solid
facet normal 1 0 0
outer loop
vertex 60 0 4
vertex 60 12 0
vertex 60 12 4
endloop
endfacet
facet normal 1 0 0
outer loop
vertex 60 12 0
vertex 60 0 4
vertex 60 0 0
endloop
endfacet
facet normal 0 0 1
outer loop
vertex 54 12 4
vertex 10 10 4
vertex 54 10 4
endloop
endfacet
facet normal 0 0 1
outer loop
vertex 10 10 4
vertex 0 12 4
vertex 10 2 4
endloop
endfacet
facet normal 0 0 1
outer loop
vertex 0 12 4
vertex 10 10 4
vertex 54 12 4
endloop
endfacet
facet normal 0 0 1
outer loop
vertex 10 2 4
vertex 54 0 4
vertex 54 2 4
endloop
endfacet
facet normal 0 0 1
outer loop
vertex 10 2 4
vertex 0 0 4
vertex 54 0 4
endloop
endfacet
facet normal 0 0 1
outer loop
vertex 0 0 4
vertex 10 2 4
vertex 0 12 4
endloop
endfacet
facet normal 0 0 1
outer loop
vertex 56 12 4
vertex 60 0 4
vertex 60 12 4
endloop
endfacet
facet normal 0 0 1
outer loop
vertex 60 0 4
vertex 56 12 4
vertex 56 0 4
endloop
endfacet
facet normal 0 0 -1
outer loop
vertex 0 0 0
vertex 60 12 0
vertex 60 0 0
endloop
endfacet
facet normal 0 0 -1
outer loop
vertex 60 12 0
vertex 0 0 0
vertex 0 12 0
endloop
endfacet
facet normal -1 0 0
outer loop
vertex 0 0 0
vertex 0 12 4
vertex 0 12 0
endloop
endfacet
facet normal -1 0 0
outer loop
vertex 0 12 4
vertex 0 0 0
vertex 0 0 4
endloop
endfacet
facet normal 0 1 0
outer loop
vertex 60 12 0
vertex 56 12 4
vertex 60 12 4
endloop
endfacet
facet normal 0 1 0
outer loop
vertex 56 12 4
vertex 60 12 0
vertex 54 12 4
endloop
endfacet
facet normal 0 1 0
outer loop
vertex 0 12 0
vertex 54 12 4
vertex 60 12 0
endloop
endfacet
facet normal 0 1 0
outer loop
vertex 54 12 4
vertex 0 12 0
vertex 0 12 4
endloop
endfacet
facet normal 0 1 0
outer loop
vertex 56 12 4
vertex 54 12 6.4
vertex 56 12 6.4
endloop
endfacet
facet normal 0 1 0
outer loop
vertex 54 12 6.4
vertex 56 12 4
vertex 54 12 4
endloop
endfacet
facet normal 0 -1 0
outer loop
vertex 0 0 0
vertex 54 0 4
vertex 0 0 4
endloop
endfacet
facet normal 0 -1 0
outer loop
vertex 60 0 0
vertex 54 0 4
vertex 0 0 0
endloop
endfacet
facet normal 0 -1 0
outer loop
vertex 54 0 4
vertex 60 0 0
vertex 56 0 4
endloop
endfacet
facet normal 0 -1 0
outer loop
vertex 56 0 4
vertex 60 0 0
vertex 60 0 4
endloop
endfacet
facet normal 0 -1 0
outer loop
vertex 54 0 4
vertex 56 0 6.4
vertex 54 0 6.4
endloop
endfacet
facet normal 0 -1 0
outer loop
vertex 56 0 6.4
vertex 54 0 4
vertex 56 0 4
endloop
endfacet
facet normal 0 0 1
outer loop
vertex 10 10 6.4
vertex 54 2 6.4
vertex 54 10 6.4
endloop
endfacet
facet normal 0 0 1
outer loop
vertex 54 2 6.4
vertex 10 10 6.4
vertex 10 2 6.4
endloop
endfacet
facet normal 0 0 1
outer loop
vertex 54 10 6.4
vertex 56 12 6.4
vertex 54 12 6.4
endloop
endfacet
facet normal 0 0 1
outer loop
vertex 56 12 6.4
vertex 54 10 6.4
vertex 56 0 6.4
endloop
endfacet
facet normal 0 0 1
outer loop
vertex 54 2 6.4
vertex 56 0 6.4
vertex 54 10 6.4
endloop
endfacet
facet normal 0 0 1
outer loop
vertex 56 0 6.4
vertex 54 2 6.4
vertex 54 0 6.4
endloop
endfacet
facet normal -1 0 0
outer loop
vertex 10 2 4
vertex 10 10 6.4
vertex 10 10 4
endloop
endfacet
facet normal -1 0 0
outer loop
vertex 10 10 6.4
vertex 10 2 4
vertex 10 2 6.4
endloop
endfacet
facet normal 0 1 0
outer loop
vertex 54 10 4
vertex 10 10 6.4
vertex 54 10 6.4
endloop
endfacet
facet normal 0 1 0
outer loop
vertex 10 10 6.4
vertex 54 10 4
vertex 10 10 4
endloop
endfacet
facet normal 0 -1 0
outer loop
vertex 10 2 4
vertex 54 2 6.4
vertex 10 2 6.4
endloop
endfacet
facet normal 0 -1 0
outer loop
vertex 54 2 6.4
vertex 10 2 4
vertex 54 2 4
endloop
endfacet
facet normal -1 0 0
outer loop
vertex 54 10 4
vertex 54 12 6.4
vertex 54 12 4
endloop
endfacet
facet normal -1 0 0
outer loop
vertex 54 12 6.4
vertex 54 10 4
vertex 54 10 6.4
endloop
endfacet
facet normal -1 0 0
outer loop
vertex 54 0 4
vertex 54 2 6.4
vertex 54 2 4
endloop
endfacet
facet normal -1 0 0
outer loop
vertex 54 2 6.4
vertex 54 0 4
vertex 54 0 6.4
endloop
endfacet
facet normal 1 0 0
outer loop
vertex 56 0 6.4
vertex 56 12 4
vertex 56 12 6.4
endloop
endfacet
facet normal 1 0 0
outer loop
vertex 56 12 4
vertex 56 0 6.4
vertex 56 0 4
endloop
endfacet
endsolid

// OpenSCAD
/*
  Cantilever snap-fit test coupon for cycle testing.
*/
base_w = 12;
base_l = 60;
base_h = 4;
arm_t  = 2.4;
arm_w  = 8;
arm_l  = 40;
hook_h = 3;
hook_o = 1.2;

union(){
  // base
  cube([base_l, base_w, base_h]);
  // arm
  translate([10, (base_w-arm_w)/2, base_h])
    cube([arm_l, arm_w, arm_t]);
  // hook
  translate([10+arm_l, (base_w-arm_w)/2, base_h+arm_t-hook_h])
    cube([4, arm_w, hook_h]);
  // stop
  translate([base_l-6, 0, 0]) cube([2, base_w, base_h+arm_t]);
}
